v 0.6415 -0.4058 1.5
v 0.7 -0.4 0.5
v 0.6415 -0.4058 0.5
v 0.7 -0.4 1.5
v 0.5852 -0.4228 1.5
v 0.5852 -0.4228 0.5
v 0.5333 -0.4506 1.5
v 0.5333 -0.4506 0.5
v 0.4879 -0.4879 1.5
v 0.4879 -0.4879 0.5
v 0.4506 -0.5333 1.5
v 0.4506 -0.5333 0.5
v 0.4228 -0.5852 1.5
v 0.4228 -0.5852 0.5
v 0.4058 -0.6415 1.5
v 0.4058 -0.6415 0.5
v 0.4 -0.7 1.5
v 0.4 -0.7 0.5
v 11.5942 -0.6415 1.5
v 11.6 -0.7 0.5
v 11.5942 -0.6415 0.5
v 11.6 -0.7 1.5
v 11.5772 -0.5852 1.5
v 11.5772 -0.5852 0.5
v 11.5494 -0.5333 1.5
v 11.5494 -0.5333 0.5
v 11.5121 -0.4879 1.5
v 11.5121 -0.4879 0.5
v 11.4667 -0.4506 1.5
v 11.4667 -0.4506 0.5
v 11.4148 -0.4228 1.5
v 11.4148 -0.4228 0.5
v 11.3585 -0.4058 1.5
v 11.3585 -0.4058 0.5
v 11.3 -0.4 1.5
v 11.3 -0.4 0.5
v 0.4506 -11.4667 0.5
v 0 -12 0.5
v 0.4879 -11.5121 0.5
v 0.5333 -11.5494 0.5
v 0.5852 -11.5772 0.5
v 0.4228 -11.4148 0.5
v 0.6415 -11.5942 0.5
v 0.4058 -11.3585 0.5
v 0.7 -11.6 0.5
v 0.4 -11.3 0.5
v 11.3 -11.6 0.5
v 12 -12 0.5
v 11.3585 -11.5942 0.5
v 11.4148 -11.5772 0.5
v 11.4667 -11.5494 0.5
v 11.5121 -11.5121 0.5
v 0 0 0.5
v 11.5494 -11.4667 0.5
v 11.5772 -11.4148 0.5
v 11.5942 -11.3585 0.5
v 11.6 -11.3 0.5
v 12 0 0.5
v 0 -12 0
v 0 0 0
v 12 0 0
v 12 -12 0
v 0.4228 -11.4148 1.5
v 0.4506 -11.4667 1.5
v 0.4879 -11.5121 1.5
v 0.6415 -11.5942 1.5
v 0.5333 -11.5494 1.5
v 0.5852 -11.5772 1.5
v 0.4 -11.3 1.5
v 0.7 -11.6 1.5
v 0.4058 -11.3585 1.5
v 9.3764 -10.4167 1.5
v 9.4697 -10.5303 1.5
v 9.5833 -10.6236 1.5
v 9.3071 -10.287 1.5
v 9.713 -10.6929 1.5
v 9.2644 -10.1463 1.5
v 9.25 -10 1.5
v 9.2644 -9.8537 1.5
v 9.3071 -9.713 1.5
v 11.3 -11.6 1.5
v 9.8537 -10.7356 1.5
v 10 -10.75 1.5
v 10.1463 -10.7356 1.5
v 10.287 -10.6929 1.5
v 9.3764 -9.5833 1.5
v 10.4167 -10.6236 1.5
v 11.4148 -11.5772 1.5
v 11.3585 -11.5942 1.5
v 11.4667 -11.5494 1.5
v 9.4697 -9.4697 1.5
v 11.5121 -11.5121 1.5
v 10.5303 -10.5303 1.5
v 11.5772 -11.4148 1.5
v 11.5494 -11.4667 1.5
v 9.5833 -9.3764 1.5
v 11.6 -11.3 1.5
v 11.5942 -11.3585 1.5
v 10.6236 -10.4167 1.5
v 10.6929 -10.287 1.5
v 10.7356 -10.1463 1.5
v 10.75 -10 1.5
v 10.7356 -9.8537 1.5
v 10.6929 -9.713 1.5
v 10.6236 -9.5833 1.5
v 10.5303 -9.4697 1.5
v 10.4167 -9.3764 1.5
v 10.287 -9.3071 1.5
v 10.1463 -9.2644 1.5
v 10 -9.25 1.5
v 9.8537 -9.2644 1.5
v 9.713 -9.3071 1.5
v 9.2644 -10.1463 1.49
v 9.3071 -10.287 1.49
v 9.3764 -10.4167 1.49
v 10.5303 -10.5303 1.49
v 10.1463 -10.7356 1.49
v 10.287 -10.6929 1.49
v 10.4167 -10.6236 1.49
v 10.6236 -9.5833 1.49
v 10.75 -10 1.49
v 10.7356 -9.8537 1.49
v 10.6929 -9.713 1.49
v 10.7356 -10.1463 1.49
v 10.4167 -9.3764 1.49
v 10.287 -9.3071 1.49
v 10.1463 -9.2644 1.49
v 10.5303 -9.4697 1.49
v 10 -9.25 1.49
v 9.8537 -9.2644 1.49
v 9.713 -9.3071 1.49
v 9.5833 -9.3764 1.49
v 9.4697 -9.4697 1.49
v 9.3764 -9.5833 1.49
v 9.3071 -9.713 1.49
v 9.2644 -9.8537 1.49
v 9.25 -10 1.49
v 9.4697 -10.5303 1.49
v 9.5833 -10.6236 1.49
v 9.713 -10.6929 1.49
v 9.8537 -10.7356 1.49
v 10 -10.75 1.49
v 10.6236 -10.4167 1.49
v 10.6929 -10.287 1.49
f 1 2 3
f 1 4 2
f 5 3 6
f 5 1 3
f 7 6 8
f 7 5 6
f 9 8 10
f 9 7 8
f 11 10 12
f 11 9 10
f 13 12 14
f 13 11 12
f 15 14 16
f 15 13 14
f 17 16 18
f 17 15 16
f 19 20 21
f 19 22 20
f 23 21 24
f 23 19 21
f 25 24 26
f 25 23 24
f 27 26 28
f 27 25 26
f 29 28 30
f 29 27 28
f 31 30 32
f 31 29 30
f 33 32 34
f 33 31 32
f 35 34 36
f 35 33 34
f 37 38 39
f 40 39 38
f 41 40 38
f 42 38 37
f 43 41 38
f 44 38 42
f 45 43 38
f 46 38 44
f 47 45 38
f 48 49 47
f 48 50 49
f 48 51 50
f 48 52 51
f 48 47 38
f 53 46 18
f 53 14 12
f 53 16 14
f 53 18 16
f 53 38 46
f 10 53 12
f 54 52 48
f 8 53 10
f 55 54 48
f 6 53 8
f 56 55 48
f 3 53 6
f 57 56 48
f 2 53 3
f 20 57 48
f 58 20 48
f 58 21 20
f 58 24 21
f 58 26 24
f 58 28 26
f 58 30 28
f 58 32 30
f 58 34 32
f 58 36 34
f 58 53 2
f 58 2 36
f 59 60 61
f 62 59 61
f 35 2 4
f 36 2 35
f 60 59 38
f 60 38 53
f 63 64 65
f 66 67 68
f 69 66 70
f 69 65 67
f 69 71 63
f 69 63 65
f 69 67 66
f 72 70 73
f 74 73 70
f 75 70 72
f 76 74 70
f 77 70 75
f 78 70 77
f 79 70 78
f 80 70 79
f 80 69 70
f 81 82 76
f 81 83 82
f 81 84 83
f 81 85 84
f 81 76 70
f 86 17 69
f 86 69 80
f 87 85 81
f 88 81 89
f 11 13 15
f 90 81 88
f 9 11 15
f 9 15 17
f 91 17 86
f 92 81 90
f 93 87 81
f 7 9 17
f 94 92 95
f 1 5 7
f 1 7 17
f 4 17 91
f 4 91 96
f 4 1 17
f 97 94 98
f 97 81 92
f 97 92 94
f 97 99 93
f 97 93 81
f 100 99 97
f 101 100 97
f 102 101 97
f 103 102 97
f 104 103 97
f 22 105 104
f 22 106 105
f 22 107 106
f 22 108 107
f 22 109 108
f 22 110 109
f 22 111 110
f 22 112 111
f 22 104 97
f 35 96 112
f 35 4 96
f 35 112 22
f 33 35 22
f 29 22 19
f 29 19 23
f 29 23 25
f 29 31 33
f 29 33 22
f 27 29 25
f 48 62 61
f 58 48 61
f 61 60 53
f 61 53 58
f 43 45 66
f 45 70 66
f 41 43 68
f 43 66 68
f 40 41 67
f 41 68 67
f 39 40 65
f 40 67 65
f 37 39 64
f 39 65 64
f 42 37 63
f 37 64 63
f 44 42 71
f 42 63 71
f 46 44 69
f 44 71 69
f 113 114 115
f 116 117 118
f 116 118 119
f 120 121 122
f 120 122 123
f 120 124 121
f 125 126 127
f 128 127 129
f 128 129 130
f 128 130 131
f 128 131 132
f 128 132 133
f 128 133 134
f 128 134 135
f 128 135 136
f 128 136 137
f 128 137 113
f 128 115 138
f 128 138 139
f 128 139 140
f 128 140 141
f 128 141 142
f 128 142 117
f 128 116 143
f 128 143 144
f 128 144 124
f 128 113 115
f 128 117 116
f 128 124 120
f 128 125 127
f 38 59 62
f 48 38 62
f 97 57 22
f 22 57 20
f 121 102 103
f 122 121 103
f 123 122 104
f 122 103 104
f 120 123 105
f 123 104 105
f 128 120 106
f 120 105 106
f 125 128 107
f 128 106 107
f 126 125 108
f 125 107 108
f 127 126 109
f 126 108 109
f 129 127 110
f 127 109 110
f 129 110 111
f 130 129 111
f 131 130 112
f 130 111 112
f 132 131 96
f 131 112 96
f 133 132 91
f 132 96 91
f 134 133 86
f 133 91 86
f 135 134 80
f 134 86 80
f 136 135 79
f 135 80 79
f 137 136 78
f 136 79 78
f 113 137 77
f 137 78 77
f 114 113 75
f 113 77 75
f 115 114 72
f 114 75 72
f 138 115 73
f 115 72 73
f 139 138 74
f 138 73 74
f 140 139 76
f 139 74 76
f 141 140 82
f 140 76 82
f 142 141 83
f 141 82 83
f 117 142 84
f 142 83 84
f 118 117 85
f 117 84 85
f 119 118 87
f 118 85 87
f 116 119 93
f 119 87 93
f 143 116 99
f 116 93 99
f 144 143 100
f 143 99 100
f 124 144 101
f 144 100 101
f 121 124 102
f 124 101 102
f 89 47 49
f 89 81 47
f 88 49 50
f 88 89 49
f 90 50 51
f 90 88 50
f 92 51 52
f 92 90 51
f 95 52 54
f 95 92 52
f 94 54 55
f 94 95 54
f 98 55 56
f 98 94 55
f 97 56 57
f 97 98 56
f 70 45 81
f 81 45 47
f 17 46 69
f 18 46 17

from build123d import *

# Parameters (mm, degrees)
ESQUISSE1_W             = 12
ESQUISSE1_H             = 12
BOSS_EXTRU_1_DEPTH      = 0.5
ESQUISSE2_W             = 11.2
ESQUISSE2_H             = 11.2
BOSS_EXTRU_2_DEPTH      = 1
CONG_1_R                = 0.3
ESQUISSE3_R             = 0.75
ENL_V_MAT_EXTRU_1_DEPTH = 0.01


with BuildPart() as part:
    # Esquisse1 → Boss.-Extru.1 (new body)
    with BuildSketch(Plane.XY):
        with Locations((6, -6)):
            Rectangle(ESQUISSE1_W, ESQUISSE1_H)
    extrude(amount=BOSS_EXTRU_1_DEPTH)

    # Esquisse2 → Boss.-Extru.2 (add)
    with BuildSketch(Plane.XY.offset(0.5)):
        with Locations((6, -6)):
            Rectangle(ESQUISSE2_W, ESQUISSE2_H)
    extrude(amount=BOSS_EXTRU_2_DEPTH)

    # Congé1
    cong_1_edges = [part.edges().sort_by_distance(p)[0] for p in [
        (0.4, -0.4, 1),
        (0.4, -11.6, 1),
        (11.6, -11.6, 1),
        (11.6, -0.4, 1),
    ]]
    fillet(cong_1_edges, radius=CONG_1_R)

    # Esquisse3 → Enlèv. mat.-Extru.1 (cut)
    with BuildSketch(Plane.XY.offset(1.5)):
        with Locations((10, -10)):
            Circle(ESQUISSE3_R)
    extrude(amount=-ENL_V_MAT_EXTRU_1_DEPTH, mode=Mode.SUBTRACT)


solid = part.part
